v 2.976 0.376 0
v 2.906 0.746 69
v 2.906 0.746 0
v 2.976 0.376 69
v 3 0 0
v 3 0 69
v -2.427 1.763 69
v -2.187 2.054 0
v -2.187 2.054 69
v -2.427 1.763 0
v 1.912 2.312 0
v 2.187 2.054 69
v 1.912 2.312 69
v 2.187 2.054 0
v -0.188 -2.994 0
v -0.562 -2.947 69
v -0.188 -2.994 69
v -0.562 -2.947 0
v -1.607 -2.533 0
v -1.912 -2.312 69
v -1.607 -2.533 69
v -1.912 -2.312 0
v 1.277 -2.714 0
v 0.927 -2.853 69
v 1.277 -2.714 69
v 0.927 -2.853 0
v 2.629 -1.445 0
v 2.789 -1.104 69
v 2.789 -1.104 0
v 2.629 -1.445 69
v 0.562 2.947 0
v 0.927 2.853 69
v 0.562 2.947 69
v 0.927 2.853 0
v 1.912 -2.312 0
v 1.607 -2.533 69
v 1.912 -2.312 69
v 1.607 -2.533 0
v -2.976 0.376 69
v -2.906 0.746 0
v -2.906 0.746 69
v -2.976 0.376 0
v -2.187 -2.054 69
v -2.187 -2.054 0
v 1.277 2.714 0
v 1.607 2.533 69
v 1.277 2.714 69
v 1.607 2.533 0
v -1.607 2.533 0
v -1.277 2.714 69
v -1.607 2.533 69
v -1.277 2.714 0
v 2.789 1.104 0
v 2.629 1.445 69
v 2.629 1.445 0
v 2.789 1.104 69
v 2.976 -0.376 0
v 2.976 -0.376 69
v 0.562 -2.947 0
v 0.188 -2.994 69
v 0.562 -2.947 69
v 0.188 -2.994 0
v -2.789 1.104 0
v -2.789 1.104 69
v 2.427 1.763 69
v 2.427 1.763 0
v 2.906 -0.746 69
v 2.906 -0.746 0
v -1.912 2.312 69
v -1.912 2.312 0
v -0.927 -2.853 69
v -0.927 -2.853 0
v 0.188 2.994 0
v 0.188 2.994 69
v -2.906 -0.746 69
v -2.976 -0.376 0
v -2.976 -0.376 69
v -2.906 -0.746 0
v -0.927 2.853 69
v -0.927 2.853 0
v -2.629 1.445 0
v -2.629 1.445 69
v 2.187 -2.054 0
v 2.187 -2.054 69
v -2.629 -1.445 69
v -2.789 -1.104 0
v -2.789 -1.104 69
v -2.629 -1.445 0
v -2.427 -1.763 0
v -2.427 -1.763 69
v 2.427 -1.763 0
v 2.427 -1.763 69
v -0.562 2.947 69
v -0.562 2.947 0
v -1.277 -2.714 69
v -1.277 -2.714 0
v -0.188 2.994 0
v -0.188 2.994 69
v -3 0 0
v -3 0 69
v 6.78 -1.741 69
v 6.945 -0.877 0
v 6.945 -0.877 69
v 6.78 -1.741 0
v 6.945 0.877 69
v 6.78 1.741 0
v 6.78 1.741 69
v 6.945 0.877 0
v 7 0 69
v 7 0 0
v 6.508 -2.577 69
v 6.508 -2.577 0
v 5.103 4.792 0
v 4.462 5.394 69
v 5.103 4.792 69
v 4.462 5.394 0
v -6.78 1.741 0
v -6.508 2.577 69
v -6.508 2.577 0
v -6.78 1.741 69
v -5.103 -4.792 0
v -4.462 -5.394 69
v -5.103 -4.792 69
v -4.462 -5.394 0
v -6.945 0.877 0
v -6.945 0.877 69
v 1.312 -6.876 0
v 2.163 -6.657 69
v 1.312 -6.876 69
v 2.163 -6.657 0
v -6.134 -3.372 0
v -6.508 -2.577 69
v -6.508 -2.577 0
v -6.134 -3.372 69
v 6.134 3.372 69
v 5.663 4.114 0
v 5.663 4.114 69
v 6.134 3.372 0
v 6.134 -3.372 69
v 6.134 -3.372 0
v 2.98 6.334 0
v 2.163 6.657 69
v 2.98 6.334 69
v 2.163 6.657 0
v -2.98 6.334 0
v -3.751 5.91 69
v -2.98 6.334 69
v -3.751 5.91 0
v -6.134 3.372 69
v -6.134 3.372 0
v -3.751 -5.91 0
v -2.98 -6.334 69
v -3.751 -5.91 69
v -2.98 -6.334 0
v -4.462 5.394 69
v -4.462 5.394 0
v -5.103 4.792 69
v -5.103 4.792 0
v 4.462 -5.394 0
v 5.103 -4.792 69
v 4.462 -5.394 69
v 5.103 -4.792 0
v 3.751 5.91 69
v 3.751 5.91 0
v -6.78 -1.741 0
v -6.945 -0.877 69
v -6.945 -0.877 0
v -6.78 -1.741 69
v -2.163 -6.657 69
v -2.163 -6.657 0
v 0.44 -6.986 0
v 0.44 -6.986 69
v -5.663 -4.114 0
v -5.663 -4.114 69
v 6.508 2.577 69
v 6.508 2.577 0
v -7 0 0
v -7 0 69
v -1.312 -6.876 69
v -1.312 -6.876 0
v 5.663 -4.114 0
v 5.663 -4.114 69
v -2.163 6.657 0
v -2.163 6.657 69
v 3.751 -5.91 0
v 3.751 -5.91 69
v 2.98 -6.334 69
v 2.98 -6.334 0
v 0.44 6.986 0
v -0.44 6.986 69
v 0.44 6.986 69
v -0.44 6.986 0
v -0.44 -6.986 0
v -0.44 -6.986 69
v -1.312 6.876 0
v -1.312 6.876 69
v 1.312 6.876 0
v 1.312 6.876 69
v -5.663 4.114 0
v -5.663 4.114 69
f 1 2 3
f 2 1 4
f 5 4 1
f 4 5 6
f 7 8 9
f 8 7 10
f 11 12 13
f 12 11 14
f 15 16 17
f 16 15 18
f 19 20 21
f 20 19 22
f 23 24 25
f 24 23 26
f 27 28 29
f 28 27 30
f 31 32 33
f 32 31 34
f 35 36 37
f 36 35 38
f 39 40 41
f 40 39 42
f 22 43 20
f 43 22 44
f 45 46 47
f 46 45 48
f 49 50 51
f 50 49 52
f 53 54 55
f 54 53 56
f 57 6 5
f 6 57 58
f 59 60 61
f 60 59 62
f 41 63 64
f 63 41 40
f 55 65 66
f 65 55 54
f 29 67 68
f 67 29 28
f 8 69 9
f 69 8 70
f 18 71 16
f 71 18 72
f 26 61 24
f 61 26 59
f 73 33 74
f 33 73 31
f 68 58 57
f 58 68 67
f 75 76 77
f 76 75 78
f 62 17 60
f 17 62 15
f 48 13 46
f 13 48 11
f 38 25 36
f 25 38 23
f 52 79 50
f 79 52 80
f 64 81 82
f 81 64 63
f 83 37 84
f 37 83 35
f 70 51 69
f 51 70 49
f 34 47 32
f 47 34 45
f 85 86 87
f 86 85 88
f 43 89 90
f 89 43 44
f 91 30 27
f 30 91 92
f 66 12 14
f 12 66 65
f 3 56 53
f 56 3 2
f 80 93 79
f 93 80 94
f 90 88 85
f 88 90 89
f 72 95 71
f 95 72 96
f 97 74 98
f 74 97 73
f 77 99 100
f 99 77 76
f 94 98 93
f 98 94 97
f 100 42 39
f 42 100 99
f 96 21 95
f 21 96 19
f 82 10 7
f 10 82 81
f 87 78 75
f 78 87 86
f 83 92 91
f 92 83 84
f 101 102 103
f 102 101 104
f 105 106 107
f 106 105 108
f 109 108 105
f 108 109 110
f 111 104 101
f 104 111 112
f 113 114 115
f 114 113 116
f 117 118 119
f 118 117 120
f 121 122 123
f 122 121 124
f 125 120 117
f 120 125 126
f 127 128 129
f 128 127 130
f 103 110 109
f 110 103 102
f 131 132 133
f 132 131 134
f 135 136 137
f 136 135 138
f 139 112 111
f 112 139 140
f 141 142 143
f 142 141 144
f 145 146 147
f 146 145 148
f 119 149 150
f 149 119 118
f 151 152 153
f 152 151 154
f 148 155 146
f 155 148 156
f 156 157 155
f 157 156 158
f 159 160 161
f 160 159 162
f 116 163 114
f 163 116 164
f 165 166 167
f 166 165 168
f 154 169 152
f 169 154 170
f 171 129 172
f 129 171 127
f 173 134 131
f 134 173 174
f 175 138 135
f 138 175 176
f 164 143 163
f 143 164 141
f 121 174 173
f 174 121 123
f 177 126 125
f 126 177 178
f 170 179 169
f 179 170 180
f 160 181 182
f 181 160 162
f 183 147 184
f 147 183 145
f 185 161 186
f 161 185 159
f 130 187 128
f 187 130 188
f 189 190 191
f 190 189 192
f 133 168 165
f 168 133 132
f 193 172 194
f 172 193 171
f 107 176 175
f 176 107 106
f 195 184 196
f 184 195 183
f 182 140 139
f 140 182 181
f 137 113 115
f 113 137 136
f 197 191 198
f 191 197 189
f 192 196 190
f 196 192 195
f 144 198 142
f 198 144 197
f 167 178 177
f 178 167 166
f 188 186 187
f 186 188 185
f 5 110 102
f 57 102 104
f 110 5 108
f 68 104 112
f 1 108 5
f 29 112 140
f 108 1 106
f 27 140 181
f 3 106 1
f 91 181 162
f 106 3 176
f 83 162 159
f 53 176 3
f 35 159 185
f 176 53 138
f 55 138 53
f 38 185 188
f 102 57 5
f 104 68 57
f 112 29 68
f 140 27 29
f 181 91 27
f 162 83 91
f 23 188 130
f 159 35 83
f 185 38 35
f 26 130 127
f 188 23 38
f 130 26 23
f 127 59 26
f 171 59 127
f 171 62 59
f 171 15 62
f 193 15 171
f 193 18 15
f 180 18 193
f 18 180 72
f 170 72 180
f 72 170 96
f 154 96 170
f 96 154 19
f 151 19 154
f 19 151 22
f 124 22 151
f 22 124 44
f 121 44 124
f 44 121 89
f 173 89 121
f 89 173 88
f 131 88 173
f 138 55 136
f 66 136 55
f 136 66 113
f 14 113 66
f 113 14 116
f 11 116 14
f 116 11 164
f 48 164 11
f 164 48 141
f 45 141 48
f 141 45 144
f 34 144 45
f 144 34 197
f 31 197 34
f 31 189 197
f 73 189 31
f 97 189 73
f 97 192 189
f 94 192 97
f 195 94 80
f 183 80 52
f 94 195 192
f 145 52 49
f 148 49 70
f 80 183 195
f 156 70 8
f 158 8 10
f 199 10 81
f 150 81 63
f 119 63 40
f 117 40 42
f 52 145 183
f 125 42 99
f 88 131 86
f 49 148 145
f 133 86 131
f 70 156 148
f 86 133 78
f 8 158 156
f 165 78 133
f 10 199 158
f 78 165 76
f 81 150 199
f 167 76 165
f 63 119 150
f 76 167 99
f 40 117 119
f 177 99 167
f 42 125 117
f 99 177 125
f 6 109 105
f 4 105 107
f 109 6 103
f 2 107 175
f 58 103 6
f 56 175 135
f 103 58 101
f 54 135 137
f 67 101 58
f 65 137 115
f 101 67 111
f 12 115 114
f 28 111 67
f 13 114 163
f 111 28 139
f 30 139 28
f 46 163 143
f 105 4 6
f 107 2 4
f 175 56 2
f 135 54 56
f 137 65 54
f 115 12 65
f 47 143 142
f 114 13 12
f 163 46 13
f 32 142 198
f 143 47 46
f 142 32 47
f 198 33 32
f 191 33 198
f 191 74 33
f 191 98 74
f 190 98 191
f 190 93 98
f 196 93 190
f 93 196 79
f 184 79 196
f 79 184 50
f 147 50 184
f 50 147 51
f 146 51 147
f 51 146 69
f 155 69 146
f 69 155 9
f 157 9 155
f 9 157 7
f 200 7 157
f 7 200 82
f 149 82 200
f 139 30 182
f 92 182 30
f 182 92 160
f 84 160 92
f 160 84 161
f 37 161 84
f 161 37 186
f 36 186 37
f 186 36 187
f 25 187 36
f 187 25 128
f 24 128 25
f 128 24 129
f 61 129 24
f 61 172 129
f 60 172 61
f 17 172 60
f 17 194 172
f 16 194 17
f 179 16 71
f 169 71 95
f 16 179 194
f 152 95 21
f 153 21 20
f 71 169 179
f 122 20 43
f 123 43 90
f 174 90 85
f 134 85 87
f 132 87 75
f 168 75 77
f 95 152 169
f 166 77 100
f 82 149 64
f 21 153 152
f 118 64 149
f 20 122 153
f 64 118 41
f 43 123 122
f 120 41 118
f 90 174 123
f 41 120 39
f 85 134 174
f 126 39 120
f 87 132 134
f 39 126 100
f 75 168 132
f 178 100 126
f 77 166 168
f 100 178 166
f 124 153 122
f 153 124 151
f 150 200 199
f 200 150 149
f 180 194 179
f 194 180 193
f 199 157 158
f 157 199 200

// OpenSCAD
$fn = 50;


difference() {
	union() {
		cylinder(h = 69, r = 7.0000000000);
	}
	union() {
		translate(v = [0.0000000000, 0.0000000000, -100.0000000000]) {
			cylinder(h = 200, r = 3.0000000000);
		}
		cylinder(h = 69, r = 1.5000000000);
		cylinder(h = 69, r = 1.5000000000);
		cylinder(h = 69, r = 1.5000000000);
	}
}
